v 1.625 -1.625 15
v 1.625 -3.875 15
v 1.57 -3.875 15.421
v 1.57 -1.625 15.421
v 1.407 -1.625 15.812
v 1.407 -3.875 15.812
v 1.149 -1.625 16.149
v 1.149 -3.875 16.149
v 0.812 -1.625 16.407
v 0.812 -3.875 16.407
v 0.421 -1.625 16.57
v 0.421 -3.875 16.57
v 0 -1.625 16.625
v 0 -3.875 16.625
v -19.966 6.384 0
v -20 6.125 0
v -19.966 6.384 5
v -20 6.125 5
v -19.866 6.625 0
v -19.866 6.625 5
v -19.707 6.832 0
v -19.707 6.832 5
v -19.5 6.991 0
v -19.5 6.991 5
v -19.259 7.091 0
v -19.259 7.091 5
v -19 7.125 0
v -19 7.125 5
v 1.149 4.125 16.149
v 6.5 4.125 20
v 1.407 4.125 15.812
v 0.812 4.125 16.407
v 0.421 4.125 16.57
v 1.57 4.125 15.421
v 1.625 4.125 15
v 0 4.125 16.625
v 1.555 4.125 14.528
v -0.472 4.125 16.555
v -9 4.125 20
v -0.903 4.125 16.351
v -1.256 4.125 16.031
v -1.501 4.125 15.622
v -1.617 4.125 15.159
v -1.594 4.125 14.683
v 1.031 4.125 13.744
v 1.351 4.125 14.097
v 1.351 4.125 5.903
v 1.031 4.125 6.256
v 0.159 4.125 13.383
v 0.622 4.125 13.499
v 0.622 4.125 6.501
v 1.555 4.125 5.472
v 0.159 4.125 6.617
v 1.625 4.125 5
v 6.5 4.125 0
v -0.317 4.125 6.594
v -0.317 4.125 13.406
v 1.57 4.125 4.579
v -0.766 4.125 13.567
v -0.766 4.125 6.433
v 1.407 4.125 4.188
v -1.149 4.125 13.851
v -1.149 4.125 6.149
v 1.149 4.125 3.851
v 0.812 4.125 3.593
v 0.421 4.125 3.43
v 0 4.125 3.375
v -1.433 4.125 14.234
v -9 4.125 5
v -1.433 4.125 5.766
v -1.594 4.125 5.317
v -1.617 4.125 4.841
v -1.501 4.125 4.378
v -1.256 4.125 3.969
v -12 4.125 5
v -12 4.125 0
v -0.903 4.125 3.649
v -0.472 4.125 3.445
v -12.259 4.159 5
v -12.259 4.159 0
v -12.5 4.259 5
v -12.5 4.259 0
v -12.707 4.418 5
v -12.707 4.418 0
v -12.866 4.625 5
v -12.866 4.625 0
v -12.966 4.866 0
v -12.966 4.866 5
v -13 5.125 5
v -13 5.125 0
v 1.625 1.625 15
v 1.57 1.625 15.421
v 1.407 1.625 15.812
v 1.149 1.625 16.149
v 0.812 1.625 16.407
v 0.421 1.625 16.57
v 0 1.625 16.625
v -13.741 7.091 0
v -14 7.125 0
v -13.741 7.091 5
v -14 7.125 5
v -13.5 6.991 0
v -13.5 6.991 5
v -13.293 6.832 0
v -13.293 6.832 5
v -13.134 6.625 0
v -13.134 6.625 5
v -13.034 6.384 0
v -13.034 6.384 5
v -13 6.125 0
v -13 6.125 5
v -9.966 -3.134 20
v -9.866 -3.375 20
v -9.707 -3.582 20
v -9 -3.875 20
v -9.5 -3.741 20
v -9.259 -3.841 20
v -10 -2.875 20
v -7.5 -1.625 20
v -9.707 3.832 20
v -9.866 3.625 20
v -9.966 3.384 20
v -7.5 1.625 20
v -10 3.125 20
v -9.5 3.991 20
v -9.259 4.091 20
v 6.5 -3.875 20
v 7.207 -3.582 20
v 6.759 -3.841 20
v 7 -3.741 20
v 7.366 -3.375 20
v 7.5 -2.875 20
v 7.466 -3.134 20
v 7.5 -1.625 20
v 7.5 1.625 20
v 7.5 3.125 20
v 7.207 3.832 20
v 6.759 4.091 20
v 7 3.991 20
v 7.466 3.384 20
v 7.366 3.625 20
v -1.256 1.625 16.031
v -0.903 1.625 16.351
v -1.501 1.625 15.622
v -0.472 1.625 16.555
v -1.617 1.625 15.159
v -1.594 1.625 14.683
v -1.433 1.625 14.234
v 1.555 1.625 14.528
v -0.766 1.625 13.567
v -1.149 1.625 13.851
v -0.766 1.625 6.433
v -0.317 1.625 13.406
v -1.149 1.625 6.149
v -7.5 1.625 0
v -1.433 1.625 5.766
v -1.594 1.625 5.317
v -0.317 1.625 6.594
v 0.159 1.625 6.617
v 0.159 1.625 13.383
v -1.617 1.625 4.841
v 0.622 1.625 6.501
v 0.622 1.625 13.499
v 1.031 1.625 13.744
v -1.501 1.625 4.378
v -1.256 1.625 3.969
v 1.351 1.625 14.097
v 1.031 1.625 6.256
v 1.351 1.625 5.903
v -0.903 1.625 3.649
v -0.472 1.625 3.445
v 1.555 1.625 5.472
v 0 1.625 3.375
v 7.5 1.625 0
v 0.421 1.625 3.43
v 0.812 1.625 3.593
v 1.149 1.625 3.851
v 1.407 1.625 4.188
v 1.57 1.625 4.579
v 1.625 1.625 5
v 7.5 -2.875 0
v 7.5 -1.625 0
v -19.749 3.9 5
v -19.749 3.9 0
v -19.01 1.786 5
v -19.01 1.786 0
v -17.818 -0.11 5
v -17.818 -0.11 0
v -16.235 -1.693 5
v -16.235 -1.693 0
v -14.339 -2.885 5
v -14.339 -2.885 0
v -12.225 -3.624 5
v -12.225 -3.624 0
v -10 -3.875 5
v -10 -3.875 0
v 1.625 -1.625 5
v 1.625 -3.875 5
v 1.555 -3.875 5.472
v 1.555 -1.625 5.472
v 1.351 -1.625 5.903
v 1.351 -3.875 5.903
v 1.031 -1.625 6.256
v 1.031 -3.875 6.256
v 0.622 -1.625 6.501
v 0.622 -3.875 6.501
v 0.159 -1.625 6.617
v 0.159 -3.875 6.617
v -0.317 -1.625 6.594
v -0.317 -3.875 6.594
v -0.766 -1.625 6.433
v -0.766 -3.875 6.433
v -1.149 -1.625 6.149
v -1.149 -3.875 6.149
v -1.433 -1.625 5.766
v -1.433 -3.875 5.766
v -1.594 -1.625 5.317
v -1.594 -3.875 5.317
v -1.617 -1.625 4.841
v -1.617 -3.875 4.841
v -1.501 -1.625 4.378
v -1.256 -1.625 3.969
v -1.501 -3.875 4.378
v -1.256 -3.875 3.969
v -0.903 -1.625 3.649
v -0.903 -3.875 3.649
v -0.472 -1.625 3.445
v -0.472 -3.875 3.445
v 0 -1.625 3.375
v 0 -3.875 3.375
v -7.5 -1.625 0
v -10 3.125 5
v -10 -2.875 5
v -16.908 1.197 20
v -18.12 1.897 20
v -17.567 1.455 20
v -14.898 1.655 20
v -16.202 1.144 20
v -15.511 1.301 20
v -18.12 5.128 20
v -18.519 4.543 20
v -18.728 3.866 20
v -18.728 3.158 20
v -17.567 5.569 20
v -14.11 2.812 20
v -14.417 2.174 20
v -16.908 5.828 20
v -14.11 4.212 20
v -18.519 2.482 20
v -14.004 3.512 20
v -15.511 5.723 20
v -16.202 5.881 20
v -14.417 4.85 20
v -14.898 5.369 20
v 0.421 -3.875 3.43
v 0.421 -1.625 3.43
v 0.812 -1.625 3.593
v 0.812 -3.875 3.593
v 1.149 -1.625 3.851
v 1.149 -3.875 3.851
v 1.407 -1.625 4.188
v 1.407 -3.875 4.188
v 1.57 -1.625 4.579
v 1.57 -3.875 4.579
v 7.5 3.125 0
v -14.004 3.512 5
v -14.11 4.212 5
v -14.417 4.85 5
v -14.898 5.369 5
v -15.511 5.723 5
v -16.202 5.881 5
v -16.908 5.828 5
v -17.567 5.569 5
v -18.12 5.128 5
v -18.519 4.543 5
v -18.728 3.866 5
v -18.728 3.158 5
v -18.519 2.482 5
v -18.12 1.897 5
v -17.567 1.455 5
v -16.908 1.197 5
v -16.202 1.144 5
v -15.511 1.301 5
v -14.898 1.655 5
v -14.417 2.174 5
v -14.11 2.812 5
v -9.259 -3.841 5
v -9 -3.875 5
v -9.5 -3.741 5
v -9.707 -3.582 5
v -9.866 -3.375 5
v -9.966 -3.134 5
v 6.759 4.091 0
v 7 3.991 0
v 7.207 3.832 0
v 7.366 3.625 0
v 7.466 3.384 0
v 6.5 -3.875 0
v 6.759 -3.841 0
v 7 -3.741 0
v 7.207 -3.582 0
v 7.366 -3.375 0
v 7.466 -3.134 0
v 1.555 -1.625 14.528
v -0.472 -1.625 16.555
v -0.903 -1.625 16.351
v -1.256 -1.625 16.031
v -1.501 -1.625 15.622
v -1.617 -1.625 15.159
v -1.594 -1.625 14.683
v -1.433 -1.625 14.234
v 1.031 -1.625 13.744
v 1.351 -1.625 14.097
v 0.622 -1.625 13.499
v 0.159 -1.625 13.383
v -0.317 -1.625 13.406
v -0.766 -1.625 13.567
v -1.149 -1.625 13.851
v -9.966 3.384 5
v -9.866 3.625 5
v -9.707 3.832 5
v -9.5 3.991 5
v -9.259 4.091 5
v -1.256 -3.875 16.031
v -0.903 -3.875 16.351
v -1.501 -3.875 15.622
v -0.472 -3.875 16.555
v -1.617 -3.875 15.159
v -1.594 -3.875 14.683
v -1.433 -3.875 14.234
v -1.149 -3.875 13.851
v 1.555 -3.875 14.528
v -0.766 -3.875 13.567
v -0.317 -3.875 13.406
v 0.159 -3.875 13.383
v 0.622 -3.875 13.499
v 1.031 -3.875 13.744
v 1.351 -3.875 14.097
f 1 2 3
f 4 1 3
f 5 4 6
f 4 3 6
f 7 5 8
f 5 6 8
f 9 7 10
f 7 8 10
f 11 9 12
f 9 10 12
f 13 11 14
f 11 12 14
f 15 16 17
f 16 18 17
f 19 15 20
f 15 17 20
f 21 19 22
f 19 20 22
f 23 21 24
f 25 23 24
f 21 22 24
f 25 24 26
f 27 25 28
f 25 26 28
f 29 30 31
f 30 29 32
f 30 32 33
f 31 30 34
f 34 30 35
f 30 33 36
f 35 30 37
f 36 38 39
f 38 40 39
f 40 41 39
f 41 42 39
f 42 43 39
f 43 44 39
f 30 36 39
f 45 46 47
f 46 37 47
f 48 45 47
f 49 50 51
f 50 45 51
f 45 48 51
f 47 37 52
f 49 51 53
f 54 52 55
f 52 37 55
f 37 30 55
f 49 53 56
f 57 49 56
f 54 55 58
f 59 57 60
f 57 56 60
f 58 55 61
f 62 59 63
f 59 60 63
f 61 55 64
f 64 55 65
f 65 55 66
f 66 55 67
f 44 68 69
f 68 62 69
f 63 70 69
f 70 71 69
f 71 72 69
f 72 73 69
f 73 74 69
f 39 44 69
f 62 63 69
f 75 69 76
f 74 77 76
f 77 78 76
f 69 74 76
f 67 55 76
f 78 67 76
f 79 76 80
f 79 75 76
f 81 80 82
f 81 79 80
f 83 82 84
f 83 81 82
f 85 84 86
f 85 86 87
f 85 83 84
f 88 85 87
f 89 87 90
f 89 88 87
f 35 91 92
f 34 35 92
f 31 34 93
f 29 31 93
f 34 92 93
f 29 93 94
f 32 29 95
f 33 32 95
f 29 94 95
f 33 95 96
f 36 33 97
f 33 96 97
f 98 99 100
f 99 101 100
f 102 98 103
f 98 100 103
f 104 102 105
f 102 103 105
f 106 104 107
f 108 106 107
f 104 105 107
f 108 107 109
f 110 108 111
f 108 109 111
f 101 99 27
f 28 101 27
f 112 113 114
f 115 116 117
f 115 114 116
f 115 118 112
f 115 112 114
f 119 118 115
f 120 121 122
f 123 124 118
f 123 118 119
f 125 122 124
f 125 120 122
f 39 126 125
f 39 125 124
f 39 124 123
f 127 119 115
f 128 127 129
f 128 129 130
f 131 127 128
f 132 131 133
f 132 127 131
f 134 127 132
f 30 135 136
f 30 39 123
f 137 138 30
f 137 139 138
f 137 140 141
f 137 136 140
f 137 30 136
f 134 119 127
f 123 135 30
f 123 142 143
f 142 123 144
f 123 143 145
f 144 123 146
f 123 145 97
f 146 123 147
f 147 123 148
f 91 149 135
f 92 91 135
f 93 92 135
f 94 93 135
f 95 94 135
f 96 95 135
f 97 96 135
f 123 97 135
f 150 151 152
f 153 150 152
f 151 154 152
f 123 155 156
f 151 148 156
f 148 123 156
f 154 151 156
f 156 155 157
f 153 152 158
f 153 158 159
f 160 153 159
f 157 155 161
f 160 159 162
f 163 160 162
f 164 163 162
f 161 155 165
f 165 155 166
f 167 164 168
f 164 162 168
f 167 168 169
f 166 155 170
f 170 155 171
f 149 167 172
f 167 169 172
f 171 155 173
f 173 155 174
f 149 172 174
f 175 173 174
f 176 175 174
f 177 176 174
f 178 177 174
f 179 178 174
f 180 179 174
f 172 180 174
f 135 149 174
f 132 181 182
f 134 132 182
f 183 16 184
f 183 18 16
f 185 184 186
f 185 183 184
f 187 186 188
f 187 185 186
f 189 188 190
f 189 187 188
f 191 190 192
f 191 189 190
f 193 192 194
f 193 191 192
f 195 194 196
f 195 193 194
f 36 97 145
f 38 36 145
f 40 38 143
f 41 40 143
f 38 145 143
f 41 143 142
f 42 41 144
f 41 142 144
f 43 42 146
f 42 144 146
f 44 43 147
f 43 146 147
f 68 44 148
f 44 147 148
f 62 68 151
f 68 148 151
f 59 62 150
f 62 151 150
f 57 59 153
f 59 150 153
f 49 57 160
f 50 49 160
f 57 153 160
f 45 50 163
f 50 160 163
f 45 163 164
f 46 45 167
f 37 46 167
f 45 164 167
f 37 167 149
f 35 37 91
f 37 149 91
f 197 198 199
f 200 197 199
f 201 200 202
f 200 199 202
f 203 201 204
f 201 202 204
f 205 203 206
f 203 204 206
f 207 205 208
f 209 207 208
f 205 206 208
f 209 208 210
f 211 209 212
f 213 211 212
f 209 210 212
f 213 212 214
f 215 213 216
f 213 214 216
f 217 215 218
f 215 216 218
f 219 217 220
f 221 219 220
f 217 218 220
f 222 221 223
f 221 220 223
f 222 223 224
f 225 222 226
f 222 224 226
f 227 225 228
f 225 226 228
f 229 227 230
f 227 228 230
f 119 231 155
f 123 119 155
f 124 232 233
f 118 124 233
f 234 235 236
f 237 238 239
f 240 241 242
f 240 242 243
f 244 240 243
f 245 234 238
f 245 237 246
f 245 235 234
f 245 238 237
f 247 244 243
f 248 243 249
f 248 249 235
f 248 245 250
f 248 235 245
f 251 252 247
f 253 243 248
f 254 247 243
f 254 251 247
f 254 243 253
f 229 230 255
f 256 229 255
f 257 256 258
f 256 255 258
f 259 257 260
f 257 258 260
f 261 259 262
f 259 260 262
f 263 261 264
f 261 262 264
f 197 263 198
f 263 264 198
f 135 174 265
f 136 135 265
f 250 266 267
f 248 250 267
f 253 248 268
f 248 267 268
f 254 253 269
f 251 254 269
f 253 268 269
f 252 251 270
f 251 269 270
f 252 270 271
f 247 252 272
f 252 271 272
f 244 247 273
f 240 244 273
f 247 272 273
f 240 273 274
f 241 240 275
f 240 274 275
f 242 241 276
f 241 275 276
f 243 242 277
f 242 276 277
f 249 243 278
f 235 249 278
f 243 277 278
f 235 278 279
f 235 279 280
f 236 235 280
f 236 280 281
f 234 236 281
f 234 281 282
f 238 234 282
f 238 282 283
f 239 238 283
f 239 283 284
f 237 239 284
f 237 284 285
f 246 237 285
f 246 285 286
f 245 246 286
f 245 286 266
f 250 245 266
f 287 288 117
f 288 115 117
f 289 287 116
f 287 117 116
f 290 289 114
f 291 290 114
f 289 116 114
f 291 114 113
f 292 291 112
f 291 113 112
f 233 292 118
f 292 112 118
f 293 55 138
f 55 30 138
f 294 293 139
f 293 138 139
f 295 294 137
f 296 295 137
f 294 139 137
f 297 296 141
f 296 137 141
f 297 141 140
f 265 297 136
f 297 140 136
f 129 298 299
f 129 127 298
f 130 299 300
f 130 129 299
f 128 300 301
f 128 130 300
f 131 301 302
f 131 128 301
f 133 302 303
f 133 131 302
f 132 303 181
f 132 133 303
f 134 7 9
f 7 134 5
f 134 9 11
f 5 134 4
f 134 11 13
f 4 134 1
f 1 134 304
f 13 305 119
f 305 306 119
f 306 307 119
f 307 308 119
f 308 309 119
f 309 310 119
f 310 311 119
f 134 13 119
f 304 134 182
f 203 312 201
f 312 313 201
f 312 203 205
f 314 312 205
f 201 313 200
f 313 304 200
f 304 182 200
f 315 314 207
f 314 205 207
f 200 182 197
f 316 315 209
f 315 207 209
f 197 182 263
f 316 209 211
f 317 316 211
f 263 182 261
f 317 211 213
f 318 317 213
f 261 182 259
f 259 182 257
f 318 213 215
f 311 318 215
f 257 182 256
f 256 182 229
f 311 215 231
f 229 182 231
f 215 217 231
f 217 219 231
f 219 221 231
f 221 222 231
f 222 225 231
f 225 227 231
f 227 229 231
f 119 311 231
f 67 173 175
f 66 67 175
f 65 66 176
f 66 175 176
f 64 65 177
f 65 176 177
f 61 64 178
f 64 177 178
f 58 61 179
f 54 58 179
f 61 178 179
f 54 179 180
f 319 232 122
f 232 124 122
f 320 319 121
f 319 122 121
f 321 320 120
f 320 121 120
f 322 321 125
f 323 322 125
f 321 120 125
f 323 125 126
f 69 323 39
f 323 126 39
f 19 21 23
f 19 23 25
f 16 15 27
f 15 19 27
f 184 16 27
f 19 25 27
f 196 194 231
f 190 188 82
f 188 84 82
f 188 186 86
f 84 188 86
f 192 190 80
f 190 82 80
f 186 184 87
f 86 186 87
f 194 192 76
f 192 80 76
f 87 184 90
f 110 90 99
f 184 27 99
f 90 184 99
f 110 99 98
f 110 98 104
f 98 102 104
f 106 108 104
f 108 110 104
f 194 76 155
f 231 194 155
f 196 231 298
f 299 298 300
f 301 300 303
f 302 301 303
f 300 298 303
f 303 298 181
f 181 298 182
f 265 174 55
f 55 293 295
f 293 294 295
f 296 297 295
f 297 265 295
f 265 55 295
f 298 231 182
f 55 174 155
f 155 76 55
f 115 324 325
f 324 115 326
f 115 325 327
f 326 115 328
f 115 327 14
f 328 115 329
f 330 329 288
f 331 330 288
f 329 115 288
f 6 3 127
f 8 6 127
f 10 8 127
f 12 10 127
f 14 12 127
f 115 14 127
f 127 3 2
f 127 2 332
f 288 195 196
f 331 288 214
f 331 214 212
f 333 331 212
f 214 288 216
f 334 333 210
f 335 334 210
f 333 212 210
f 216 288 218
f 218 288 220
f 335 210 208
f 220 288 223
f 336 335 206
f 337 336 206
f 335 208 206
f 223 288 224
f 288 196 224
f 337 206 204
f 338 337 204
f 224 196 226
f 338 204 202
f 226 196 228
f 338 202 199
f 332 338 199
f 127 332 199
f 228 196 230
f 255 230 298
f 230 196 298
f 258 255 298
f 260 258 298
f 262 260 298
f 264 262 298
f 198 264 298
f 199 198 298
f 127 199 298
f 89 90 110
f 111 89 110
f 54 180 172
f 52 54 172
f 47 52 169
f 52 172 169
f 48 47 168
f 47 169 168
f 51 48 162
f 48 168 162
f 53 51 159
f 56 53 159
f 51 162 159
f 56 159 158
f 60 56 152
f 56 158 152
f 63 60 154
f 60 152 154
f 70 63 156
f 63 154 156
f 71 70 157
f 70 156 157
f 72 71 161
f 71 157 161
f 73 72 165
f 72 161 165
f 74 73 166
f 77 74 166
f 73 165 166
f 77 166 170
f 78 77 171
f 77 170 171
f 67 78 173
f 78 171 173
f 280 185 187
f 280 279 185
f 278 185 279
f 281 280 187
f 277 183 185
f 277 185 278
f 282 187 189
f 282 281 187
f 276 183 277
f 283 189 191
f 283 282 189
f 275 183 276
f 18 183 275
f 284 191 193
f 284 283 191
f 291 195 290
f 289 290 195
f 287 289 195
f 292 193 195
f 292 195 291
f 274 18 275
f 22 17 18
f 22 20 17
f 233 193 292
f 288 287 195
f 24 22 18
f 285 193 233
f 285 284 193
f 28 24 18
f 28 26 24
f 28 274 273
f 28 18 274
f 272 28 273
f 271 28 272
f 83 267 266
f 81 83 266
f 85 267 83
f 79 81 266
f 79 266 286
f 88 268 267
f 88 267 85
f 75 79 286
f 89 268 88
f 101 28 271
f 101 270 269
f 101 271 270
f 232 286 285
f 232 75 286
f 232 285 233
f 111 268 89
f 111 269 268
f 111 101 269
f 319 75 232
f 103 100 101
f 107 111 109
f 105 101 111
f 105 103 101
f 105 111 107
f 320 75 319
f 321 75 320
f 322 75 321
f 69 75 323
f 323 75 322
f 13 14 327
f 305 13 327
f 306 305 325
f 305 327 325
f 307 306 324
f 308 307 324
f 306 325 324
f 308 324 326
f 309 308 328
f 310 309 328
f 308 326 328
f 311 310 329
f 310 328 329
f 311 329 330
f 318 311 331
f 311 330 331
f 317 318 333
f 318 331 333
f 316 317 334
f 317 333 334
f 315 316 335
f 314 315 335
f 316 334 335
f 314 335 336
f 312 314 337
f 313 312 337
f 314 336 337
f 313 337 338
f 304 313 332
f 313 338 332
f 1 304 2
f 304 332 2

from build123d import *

# Parameters (mm, degrees)
F1_DEPTH = 20
F0_R     = 2.375
F2_DEPTH = 5
F3_DEPTH = 20
F4_R     = 1
F6_DEPTH = 8.5
F7_R     = 9.99999


# Not quite as in the source:
# - a fillet or chamfer is up to 0.001 mm smaller than in the source, because OpenCascade refuses the exact size


with BuildPart() as f1:
    # F0 (on Top) → F1 (new body)
    with BuildSketch(Plane.XY):
        Polygon((7.5, -3.875), (7.5, -1.625), (-7.5, -1.625), (-7.5, 1.625), (7.5, 1.625), (7.5, 4.125), (-10, 4.125), (-10, -3.875), align=None)
    extrude(amount=F1_DEPTH)

    # F0 (on Top) → F2 (join)
    with BuildSketch(Plane.XY):
        Polygon((-20, -3.875), (-10, -3.875), (-10, 4.125), (-13, 4.125), (-13, 7.125), (-20, 7.125), align=None)
        with Locations((-16.3791049272, 3.5122572444)):
            Circle(F0_R, mode=Mode.SUBTRACT)
    extrude(amount=F2_DEPTH)

    # F0 (on Top) → F3 (join)
    with BuildSketch(Plane.XY):
        with Locations((-16.3791049272, 3.5122572444)):
            Circle(F0_R)
    extrude(amount=F3_DEPTH)

    # F4
    f4_edges = [f1.edges().sort_by_distance(p)[0] for p in [
        (-20, 7.125, 2.5),
        (7.5, 4.125, 10),
        (7.5, -3.875, 10),
        (-10, 4.125, 12.5),
        (-10, -3.875, 12.5),
        (-13, 7.125, 2.5),
        (-13, 4.125, 2.5),
    ]]
    fillet(f4_edges, radius=F4_R)

    # F5 (on face) → F6 (cut)
    with BuildSketch(Plane.XZ.offset(3.875)):
        with BuildLine():
            ThreePointArc((1.625, 15), (1.1490485194, 16.1490485194), (0, 16.625))
            ThreePointArc((0, 16.625), (-1.1490485194, 13.8509514806), (1.625, 15))
        make_face()
        with BuildLine():
            ThreePointArc((1.625, 5), (-1.1490485194, 6.1490485194), (0, 3.375))
            ThreePointArc((0, 3.375), (1.1490485194, 3.8509514806), (1.625, 5))
        make_face()
    extrude(amount=-F6_DEPTH, mode=Mode.SUBTRACT)

    # F7 (radius 10 in the source; OpenCascade refuses exactly that, so slightly less here)
    f7_edges = [f1.edges().sort_by_distance(p)[0] for p in [
        (-20, -3.875, 2.5),
    ]]
    fillet(f7_edges, radius=F7_R)


solid = f1.part
